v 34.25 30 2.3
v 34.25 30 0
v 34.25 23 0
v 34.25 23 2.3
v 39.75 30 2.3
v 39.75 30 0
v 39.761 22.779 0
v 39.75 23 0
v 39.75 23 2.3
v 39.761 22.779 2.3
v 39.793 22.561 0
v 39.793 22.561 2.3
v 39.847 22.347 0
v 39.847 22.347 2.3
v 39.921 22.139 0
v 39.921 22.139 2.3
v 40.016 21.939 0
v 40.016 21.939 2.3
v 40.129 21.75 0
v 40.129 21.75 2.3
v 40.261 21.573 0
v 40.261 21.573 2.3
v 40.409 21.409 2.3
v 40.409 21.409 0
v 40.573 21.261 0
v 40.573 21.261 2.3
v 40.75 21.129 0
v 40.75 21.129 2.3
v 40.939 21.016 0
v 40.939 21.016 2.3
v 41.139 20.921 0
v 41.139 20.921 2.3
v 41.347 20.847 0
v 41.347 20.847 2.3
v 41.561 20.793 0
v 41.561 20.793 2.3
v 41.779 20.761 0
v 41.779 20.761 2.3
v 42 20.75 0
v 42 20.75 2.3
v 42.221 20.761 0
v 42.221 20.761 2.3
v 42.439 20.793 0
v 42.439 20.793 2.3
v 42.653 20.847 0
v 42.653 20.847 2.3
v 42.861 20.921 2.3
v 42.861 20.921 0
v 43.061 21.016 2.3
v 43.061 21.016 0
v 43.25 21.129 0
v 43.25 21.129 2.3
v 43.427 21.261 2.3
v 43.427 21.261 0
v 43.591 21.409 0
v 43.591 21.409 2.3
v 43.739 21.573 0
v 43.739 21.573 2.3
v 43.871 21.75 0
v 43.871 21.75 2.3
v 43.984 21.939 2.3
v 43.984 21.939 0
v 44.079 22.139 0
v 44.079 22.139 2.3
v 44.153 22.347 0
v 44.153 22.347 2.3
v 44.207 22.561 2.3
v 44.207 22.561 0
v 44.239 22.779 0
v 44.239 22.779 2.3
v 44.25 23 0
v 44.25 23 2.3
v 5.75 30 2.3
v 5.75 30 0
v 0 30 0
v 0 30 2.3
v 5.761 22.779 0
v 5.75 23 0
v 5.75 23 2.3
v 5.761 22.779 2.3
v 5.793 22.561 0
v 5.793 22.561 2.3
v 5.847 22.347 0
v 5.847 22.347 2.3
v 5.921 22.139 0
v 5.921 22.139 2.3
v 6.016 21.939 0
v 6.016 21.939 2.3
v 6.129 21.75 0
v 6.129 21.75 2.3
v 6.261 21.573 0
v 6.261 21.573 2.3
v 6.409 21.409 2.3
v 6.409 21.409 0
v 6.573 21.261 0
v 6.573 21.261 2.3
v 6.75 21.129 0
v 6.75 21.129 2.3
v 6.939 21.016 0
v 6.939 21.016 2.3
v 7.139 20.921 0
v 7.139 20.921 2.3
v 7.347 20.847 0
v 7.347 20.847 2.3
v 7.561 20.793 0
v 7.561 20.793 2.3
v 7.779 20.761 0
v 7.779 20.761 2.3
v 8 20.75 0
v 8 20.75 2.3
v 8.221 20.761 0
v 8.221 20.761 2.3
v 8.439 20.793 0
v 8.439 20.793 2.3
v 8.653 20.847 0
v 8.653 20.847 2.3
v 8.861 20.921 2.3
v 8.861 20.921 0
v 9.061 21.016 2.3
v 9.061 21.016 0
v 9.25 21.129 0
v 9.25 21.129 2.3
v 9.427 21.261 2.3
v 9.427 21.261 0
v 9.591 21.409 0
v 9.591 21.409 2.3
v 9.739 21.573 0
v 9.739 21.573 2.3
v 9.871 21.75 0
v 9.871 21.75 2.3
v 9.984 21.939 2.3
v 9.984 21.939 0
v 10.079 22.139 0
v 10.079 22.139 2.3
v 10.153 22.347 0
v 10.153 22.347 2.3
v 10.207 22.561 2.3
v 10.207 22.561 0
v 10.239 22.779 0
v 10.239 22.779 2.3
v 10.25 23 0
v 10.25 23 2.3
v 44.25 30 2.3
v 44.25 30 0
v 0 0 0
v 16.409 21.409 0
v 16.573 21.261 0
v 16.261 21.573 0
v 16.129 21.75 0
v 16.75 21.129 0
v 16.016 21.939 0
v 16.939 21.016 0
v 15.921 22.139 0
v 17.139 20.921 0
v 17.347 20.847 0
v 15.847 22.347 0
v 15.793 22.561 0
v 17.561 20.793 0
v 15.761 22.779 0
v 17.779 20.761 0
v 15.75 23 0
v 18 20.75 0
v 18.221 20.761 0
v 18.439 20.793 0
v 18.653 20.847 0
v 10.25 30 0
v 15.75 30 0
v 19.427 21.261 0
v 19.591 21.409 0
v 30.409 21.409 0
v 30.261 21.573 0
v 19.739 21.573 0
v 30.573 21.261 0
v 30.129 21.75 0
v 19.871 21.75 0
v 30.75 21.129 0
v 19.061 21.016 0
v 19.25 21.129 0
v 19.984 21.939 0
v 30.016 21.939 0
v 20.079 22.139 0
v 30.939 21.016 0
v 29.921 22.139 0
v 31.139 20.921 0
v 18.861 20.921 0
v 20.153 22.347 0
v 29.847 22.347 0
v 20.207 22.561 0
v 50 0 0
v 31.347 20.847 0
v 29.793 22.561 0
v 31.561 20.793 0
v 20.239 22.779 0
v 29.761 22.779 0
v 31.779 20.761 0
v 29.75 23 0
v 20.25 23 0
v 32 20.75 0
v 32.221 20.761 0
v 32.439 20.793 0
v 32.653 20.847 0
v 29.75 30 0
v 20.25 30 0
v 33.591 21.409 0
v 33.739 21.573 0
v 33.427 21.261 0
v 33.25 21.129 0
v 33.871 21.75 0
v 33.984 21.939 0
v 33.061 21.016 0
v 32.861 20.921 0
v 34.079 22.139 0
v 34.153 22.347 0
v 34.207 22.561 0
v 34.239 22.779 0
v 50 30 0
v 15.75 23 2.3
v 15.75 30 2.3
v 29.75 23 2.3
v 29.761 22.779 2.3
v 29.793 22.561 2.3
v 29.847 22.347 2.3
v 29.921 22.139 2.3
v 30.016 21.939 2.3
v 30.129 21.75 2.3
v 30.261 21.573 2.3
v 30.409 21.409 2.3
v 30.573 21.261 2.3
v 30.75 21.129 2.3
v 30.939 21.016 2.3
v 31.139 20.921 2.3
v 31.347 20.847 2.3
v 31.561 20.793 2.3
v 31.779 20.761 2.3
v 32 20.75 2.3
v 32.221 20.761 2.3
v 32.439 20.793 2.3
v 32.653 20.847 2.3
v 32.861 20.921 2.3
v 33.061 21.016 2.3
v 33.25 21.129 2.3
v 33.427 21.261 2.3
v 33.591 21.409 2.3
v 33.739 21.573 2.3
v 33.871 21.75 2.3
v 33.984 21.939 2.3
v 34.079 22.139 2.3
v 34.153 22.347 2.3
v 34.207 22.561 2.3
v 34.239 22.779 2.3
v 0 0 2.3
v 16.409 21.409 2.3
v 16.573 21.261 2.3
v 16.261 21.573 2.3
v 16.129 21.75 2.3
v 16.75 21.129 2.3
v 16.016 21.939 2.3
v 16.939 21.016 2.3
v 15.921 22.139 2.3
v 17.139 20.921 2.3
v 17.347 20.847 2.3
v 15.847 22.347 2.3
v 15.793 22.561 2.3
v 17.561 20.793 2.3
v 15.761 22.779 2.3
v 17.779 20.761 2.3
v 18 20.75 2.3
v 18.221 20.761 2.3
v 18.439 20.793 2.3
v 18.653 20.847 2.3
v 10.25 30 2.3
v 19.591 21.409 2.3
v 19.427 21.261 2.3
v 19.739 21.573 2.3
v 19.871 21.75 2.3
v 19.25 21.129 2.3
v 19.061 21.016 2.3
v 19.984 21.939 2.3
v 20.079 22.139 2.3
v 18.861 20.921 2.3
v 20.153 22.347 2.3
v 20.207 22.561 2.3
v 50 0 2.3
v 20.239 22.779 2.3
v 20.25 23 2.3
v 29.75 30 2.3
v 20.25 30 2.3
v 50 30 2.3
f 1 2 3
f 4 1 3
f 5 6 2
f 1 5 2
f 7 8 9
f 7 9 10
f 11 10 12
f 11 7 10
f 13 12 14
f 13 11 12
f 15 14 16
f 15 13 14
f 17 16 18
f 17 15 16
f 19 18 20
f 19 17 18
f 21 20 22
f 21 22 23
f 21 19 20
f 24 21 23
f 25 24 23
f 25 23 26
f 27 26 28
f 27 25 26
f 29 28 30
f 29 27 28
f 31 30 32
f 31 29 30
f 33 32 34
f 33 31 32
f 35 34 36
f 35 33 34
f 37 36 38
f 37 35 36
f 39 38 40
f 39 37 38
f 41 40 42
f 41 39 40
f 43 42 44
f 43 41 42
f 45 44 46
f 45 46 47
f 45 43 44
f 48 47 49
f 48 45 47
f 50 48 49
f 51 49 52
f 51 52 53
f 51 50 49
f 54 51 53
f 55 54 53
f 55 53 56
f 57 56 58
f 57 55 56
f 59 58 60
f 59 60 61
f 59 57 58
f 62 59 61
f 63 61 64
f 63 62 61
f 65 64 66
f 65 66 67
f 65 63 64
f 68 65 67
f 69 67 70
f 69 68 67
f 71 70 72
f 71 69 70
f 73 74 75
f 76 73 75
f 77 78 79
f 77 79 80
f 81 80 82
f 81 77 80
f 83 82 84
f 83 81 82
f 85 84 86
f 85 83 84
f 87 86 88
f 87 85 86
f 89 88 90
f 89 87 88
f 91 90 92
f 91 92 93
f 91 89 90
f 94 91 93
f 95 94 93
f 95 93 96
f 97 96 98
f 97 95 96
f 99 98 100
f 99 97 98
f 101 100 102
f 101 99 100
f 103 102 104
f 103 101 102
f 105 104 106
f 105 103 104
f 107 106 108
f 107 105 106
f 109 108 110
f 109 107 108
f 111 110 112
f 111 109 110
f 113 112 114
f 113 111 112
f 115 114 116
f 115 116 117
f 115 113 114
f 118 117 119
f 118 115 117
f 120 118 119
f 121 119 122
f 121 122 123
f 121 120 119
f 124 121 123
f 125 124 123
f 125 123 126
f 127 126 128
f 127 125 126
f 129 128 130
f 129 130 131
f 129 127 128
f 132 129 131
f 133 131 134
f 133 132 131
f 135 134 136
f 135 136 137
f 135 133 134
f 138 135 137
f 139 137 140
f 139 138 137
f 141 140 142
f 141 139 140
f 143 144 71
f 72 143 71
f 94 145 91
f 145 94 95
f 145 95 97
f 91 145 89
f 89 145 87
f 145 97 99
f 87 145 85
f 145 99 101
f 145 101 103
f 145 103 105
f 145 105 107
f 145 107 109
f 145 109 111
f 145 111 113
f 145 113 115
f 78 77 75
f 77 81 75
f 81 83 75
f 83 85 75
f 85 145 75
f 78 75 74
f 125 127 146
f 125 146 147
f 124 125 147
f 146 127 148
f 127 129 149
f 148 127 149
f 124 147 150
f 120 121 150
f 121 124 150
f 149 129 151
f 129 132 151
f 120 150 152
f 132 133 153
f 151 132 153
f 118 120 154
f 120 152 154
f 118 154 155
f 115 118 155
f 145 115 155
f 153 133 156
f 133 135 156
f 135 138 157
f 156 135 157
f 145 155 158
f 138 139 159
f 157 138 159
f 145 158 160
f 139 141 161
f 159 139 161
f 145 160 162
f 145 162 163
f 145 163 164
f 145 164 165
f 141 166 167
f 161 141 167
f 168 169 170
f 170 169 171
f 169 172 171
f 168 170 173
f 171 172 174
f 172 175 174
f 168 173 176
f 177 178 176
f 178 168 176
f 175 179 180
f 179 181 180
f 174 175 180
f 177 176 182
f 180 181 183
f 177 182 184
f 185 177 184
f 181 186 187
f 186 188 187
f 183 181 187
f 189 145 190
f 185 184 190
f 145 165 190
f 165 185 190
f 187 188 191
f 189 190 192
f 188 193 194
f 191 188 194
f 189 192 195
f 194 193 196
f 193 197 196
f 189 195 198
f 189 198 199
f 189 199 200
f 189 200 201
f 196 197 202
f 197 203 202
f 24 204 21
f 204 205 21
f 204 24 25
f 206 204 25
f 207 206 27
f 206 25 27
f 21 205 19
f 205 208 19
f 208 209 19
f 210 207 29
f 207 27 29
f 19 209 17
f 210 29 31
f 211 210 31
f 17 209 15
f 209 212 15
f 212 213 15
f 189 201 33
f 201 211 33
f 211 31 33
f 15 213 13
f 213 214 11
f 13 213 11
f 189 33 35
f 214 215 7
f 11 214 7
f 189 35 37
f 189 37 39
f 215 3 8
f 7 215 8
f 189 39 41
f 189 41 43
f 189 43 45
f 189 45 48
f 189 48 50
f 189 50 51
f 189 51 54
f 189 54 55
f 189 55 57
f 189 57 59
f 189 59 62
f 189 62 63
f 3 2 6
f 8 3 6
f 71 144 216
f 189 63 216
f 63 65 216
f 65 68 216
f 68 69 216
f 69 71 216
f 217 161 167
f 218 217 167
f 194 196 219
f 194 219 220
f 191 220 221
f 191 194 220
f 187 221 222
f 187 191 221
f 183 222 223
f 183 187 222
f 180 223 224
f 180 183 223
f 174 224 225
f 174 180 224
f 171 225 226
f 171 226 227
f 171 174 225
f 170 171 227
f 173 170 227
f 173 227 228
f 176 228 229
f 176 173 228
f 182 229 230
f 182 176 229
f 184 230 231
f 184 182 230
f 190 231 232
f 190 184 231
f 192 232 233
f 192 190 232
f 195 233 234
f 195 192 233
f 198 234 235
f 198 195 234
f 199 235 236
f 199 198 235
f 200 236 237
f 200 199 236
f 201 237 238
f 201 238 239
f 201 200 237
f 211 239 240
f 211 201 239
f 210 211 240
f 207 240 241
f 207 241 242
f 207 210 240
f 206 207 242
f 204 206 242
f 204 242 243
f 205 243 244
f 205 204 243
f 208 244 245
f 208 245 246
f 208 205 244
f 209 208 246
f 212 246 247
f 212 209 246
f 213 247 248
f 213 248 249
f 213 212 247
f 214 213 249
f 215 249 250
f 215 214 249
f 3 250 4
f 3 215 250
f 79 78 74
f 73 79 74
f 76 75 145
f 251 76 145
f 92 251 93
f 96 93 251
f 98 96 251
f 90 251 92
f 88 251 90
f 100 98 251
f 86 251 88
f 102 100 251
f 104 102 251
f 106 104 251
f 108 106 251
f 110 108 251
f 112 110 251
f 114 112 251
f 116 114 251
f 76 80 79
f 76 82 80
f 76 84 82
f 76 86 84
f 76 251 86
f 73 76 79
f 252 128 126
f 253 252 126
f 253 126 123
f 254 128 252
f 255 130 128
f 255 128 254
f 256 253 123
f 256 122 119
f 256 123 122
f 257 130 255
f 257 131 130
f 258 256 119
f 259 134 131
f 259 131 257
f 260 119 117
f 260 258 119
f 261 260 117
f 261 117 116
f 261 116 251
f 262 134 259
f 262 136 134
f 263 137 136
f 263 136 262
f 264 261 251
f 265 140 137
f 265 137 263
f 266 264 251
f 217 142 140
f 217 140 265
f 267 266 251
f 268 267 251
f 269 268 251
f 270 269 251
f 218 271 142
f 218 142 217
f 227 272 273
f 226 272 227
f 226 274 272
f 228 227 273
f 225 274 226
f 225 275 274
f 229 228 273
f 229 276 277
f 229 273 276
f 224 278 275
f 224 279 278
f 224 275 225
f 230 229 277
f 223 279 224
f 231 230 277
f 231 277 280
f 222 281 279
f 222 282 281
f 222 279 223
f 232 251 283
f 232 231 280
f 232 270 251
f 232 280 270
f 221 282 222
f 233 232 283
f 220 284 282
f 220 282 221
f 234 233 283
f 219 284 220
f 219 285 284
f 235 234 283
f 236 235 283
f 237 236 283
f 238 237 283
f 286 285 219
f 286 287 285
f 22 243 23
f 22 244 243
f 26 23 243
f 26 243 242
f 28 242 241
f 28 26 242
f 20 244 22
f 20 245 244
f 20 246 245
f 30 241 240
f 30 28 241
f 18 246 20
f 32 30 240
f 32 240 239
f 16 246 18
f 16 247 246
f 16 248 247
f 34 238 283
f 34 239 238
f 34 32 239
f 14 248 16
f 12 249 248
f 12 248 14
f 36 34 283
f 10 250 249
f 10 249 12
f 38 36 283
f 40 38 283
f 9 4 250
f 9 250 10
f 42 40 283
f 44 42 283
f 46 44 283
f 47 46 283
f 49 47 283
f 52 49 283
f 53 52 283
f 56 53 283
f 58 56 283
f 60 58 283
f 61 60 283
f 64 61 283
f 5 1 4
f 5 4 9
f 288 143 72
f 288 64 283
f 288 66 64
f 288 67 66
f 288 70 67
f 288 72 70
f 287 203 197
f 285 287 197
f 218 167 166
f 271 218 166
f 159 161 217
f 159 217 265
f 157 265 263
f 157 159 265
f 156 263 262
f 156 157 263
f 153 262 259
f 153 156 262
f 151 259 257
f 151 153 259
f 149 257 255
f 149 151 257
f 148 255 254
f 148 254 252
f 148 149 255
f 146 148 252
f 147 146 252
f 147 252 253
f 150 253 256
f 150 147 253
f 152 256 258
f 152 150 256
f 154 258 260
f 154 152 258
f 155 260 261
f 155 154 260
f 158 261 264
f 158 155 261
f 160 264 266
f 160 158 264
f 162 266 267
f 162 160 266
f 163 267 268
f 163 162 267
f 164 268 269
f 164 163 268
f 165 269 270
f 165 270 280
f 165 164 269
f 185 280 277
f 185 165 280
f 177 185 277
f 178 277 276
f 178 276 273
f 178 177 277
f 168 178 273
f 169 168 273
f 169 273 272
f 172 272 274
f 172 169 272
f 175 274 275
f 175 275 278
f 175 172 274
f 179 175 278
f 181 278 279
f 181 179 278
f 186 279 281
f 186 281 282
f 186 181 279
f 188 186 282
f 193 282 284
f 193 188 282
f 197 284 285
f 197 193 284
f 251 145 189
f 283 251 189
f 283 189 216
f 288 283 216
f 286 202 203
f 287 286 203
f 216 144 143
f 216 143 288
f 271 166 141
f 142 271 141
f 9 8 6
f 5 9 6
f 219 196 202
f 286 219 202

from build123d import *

# Parameters (mm, degrees)
PAD_DEPTH = 2.3


with BuildPart() as part:
    # Sketch → Pad (new body)
    with BuildSketch(Plane.XY):
        with BuildLine():
            Line((0, 0), (50, 0))
            Line((50, 0), (50, 30))
            Line((44.25, 30), (50, 30))
            Line((44.25, 30), (44.25, 23))
            ThreePointArc((39.75, 23), (42, 20.75), (44.25, 23))
            Line((39.75, 23), (39.75, 30))
            Line((39.75, 30), (34.25, 30))
            Line((34.25, 30), (34.25, 23))
            ThreePointArc((29.75, 23), (32, 20.75), (34.25, 23))
            Line((29.75, 23), (29.75, 30))
            Line((29.75, 30), (20.25, 30))
            Line((20.25, 30), (20.25, 23))
            ThreePointArc((15.75, 23), (18, 20.75), (20.25, 23))
            Line((15.75, 23), (15.75, 30))
            Line((15.75, 30), (10.25, 30))
            Line((10.25, 30), (10.25, 23))
            ThreePointArc((5.75, 23), (8, 20.75), (10.25, 23))
            Line((5.75, 23), (5.75, 30))
            Line((5.75, 30), (0, 30))
            Line((0, 30), (0, 0))
        make_face()
    extrude(amount=PAD_DEPTH)


solid = part.part
